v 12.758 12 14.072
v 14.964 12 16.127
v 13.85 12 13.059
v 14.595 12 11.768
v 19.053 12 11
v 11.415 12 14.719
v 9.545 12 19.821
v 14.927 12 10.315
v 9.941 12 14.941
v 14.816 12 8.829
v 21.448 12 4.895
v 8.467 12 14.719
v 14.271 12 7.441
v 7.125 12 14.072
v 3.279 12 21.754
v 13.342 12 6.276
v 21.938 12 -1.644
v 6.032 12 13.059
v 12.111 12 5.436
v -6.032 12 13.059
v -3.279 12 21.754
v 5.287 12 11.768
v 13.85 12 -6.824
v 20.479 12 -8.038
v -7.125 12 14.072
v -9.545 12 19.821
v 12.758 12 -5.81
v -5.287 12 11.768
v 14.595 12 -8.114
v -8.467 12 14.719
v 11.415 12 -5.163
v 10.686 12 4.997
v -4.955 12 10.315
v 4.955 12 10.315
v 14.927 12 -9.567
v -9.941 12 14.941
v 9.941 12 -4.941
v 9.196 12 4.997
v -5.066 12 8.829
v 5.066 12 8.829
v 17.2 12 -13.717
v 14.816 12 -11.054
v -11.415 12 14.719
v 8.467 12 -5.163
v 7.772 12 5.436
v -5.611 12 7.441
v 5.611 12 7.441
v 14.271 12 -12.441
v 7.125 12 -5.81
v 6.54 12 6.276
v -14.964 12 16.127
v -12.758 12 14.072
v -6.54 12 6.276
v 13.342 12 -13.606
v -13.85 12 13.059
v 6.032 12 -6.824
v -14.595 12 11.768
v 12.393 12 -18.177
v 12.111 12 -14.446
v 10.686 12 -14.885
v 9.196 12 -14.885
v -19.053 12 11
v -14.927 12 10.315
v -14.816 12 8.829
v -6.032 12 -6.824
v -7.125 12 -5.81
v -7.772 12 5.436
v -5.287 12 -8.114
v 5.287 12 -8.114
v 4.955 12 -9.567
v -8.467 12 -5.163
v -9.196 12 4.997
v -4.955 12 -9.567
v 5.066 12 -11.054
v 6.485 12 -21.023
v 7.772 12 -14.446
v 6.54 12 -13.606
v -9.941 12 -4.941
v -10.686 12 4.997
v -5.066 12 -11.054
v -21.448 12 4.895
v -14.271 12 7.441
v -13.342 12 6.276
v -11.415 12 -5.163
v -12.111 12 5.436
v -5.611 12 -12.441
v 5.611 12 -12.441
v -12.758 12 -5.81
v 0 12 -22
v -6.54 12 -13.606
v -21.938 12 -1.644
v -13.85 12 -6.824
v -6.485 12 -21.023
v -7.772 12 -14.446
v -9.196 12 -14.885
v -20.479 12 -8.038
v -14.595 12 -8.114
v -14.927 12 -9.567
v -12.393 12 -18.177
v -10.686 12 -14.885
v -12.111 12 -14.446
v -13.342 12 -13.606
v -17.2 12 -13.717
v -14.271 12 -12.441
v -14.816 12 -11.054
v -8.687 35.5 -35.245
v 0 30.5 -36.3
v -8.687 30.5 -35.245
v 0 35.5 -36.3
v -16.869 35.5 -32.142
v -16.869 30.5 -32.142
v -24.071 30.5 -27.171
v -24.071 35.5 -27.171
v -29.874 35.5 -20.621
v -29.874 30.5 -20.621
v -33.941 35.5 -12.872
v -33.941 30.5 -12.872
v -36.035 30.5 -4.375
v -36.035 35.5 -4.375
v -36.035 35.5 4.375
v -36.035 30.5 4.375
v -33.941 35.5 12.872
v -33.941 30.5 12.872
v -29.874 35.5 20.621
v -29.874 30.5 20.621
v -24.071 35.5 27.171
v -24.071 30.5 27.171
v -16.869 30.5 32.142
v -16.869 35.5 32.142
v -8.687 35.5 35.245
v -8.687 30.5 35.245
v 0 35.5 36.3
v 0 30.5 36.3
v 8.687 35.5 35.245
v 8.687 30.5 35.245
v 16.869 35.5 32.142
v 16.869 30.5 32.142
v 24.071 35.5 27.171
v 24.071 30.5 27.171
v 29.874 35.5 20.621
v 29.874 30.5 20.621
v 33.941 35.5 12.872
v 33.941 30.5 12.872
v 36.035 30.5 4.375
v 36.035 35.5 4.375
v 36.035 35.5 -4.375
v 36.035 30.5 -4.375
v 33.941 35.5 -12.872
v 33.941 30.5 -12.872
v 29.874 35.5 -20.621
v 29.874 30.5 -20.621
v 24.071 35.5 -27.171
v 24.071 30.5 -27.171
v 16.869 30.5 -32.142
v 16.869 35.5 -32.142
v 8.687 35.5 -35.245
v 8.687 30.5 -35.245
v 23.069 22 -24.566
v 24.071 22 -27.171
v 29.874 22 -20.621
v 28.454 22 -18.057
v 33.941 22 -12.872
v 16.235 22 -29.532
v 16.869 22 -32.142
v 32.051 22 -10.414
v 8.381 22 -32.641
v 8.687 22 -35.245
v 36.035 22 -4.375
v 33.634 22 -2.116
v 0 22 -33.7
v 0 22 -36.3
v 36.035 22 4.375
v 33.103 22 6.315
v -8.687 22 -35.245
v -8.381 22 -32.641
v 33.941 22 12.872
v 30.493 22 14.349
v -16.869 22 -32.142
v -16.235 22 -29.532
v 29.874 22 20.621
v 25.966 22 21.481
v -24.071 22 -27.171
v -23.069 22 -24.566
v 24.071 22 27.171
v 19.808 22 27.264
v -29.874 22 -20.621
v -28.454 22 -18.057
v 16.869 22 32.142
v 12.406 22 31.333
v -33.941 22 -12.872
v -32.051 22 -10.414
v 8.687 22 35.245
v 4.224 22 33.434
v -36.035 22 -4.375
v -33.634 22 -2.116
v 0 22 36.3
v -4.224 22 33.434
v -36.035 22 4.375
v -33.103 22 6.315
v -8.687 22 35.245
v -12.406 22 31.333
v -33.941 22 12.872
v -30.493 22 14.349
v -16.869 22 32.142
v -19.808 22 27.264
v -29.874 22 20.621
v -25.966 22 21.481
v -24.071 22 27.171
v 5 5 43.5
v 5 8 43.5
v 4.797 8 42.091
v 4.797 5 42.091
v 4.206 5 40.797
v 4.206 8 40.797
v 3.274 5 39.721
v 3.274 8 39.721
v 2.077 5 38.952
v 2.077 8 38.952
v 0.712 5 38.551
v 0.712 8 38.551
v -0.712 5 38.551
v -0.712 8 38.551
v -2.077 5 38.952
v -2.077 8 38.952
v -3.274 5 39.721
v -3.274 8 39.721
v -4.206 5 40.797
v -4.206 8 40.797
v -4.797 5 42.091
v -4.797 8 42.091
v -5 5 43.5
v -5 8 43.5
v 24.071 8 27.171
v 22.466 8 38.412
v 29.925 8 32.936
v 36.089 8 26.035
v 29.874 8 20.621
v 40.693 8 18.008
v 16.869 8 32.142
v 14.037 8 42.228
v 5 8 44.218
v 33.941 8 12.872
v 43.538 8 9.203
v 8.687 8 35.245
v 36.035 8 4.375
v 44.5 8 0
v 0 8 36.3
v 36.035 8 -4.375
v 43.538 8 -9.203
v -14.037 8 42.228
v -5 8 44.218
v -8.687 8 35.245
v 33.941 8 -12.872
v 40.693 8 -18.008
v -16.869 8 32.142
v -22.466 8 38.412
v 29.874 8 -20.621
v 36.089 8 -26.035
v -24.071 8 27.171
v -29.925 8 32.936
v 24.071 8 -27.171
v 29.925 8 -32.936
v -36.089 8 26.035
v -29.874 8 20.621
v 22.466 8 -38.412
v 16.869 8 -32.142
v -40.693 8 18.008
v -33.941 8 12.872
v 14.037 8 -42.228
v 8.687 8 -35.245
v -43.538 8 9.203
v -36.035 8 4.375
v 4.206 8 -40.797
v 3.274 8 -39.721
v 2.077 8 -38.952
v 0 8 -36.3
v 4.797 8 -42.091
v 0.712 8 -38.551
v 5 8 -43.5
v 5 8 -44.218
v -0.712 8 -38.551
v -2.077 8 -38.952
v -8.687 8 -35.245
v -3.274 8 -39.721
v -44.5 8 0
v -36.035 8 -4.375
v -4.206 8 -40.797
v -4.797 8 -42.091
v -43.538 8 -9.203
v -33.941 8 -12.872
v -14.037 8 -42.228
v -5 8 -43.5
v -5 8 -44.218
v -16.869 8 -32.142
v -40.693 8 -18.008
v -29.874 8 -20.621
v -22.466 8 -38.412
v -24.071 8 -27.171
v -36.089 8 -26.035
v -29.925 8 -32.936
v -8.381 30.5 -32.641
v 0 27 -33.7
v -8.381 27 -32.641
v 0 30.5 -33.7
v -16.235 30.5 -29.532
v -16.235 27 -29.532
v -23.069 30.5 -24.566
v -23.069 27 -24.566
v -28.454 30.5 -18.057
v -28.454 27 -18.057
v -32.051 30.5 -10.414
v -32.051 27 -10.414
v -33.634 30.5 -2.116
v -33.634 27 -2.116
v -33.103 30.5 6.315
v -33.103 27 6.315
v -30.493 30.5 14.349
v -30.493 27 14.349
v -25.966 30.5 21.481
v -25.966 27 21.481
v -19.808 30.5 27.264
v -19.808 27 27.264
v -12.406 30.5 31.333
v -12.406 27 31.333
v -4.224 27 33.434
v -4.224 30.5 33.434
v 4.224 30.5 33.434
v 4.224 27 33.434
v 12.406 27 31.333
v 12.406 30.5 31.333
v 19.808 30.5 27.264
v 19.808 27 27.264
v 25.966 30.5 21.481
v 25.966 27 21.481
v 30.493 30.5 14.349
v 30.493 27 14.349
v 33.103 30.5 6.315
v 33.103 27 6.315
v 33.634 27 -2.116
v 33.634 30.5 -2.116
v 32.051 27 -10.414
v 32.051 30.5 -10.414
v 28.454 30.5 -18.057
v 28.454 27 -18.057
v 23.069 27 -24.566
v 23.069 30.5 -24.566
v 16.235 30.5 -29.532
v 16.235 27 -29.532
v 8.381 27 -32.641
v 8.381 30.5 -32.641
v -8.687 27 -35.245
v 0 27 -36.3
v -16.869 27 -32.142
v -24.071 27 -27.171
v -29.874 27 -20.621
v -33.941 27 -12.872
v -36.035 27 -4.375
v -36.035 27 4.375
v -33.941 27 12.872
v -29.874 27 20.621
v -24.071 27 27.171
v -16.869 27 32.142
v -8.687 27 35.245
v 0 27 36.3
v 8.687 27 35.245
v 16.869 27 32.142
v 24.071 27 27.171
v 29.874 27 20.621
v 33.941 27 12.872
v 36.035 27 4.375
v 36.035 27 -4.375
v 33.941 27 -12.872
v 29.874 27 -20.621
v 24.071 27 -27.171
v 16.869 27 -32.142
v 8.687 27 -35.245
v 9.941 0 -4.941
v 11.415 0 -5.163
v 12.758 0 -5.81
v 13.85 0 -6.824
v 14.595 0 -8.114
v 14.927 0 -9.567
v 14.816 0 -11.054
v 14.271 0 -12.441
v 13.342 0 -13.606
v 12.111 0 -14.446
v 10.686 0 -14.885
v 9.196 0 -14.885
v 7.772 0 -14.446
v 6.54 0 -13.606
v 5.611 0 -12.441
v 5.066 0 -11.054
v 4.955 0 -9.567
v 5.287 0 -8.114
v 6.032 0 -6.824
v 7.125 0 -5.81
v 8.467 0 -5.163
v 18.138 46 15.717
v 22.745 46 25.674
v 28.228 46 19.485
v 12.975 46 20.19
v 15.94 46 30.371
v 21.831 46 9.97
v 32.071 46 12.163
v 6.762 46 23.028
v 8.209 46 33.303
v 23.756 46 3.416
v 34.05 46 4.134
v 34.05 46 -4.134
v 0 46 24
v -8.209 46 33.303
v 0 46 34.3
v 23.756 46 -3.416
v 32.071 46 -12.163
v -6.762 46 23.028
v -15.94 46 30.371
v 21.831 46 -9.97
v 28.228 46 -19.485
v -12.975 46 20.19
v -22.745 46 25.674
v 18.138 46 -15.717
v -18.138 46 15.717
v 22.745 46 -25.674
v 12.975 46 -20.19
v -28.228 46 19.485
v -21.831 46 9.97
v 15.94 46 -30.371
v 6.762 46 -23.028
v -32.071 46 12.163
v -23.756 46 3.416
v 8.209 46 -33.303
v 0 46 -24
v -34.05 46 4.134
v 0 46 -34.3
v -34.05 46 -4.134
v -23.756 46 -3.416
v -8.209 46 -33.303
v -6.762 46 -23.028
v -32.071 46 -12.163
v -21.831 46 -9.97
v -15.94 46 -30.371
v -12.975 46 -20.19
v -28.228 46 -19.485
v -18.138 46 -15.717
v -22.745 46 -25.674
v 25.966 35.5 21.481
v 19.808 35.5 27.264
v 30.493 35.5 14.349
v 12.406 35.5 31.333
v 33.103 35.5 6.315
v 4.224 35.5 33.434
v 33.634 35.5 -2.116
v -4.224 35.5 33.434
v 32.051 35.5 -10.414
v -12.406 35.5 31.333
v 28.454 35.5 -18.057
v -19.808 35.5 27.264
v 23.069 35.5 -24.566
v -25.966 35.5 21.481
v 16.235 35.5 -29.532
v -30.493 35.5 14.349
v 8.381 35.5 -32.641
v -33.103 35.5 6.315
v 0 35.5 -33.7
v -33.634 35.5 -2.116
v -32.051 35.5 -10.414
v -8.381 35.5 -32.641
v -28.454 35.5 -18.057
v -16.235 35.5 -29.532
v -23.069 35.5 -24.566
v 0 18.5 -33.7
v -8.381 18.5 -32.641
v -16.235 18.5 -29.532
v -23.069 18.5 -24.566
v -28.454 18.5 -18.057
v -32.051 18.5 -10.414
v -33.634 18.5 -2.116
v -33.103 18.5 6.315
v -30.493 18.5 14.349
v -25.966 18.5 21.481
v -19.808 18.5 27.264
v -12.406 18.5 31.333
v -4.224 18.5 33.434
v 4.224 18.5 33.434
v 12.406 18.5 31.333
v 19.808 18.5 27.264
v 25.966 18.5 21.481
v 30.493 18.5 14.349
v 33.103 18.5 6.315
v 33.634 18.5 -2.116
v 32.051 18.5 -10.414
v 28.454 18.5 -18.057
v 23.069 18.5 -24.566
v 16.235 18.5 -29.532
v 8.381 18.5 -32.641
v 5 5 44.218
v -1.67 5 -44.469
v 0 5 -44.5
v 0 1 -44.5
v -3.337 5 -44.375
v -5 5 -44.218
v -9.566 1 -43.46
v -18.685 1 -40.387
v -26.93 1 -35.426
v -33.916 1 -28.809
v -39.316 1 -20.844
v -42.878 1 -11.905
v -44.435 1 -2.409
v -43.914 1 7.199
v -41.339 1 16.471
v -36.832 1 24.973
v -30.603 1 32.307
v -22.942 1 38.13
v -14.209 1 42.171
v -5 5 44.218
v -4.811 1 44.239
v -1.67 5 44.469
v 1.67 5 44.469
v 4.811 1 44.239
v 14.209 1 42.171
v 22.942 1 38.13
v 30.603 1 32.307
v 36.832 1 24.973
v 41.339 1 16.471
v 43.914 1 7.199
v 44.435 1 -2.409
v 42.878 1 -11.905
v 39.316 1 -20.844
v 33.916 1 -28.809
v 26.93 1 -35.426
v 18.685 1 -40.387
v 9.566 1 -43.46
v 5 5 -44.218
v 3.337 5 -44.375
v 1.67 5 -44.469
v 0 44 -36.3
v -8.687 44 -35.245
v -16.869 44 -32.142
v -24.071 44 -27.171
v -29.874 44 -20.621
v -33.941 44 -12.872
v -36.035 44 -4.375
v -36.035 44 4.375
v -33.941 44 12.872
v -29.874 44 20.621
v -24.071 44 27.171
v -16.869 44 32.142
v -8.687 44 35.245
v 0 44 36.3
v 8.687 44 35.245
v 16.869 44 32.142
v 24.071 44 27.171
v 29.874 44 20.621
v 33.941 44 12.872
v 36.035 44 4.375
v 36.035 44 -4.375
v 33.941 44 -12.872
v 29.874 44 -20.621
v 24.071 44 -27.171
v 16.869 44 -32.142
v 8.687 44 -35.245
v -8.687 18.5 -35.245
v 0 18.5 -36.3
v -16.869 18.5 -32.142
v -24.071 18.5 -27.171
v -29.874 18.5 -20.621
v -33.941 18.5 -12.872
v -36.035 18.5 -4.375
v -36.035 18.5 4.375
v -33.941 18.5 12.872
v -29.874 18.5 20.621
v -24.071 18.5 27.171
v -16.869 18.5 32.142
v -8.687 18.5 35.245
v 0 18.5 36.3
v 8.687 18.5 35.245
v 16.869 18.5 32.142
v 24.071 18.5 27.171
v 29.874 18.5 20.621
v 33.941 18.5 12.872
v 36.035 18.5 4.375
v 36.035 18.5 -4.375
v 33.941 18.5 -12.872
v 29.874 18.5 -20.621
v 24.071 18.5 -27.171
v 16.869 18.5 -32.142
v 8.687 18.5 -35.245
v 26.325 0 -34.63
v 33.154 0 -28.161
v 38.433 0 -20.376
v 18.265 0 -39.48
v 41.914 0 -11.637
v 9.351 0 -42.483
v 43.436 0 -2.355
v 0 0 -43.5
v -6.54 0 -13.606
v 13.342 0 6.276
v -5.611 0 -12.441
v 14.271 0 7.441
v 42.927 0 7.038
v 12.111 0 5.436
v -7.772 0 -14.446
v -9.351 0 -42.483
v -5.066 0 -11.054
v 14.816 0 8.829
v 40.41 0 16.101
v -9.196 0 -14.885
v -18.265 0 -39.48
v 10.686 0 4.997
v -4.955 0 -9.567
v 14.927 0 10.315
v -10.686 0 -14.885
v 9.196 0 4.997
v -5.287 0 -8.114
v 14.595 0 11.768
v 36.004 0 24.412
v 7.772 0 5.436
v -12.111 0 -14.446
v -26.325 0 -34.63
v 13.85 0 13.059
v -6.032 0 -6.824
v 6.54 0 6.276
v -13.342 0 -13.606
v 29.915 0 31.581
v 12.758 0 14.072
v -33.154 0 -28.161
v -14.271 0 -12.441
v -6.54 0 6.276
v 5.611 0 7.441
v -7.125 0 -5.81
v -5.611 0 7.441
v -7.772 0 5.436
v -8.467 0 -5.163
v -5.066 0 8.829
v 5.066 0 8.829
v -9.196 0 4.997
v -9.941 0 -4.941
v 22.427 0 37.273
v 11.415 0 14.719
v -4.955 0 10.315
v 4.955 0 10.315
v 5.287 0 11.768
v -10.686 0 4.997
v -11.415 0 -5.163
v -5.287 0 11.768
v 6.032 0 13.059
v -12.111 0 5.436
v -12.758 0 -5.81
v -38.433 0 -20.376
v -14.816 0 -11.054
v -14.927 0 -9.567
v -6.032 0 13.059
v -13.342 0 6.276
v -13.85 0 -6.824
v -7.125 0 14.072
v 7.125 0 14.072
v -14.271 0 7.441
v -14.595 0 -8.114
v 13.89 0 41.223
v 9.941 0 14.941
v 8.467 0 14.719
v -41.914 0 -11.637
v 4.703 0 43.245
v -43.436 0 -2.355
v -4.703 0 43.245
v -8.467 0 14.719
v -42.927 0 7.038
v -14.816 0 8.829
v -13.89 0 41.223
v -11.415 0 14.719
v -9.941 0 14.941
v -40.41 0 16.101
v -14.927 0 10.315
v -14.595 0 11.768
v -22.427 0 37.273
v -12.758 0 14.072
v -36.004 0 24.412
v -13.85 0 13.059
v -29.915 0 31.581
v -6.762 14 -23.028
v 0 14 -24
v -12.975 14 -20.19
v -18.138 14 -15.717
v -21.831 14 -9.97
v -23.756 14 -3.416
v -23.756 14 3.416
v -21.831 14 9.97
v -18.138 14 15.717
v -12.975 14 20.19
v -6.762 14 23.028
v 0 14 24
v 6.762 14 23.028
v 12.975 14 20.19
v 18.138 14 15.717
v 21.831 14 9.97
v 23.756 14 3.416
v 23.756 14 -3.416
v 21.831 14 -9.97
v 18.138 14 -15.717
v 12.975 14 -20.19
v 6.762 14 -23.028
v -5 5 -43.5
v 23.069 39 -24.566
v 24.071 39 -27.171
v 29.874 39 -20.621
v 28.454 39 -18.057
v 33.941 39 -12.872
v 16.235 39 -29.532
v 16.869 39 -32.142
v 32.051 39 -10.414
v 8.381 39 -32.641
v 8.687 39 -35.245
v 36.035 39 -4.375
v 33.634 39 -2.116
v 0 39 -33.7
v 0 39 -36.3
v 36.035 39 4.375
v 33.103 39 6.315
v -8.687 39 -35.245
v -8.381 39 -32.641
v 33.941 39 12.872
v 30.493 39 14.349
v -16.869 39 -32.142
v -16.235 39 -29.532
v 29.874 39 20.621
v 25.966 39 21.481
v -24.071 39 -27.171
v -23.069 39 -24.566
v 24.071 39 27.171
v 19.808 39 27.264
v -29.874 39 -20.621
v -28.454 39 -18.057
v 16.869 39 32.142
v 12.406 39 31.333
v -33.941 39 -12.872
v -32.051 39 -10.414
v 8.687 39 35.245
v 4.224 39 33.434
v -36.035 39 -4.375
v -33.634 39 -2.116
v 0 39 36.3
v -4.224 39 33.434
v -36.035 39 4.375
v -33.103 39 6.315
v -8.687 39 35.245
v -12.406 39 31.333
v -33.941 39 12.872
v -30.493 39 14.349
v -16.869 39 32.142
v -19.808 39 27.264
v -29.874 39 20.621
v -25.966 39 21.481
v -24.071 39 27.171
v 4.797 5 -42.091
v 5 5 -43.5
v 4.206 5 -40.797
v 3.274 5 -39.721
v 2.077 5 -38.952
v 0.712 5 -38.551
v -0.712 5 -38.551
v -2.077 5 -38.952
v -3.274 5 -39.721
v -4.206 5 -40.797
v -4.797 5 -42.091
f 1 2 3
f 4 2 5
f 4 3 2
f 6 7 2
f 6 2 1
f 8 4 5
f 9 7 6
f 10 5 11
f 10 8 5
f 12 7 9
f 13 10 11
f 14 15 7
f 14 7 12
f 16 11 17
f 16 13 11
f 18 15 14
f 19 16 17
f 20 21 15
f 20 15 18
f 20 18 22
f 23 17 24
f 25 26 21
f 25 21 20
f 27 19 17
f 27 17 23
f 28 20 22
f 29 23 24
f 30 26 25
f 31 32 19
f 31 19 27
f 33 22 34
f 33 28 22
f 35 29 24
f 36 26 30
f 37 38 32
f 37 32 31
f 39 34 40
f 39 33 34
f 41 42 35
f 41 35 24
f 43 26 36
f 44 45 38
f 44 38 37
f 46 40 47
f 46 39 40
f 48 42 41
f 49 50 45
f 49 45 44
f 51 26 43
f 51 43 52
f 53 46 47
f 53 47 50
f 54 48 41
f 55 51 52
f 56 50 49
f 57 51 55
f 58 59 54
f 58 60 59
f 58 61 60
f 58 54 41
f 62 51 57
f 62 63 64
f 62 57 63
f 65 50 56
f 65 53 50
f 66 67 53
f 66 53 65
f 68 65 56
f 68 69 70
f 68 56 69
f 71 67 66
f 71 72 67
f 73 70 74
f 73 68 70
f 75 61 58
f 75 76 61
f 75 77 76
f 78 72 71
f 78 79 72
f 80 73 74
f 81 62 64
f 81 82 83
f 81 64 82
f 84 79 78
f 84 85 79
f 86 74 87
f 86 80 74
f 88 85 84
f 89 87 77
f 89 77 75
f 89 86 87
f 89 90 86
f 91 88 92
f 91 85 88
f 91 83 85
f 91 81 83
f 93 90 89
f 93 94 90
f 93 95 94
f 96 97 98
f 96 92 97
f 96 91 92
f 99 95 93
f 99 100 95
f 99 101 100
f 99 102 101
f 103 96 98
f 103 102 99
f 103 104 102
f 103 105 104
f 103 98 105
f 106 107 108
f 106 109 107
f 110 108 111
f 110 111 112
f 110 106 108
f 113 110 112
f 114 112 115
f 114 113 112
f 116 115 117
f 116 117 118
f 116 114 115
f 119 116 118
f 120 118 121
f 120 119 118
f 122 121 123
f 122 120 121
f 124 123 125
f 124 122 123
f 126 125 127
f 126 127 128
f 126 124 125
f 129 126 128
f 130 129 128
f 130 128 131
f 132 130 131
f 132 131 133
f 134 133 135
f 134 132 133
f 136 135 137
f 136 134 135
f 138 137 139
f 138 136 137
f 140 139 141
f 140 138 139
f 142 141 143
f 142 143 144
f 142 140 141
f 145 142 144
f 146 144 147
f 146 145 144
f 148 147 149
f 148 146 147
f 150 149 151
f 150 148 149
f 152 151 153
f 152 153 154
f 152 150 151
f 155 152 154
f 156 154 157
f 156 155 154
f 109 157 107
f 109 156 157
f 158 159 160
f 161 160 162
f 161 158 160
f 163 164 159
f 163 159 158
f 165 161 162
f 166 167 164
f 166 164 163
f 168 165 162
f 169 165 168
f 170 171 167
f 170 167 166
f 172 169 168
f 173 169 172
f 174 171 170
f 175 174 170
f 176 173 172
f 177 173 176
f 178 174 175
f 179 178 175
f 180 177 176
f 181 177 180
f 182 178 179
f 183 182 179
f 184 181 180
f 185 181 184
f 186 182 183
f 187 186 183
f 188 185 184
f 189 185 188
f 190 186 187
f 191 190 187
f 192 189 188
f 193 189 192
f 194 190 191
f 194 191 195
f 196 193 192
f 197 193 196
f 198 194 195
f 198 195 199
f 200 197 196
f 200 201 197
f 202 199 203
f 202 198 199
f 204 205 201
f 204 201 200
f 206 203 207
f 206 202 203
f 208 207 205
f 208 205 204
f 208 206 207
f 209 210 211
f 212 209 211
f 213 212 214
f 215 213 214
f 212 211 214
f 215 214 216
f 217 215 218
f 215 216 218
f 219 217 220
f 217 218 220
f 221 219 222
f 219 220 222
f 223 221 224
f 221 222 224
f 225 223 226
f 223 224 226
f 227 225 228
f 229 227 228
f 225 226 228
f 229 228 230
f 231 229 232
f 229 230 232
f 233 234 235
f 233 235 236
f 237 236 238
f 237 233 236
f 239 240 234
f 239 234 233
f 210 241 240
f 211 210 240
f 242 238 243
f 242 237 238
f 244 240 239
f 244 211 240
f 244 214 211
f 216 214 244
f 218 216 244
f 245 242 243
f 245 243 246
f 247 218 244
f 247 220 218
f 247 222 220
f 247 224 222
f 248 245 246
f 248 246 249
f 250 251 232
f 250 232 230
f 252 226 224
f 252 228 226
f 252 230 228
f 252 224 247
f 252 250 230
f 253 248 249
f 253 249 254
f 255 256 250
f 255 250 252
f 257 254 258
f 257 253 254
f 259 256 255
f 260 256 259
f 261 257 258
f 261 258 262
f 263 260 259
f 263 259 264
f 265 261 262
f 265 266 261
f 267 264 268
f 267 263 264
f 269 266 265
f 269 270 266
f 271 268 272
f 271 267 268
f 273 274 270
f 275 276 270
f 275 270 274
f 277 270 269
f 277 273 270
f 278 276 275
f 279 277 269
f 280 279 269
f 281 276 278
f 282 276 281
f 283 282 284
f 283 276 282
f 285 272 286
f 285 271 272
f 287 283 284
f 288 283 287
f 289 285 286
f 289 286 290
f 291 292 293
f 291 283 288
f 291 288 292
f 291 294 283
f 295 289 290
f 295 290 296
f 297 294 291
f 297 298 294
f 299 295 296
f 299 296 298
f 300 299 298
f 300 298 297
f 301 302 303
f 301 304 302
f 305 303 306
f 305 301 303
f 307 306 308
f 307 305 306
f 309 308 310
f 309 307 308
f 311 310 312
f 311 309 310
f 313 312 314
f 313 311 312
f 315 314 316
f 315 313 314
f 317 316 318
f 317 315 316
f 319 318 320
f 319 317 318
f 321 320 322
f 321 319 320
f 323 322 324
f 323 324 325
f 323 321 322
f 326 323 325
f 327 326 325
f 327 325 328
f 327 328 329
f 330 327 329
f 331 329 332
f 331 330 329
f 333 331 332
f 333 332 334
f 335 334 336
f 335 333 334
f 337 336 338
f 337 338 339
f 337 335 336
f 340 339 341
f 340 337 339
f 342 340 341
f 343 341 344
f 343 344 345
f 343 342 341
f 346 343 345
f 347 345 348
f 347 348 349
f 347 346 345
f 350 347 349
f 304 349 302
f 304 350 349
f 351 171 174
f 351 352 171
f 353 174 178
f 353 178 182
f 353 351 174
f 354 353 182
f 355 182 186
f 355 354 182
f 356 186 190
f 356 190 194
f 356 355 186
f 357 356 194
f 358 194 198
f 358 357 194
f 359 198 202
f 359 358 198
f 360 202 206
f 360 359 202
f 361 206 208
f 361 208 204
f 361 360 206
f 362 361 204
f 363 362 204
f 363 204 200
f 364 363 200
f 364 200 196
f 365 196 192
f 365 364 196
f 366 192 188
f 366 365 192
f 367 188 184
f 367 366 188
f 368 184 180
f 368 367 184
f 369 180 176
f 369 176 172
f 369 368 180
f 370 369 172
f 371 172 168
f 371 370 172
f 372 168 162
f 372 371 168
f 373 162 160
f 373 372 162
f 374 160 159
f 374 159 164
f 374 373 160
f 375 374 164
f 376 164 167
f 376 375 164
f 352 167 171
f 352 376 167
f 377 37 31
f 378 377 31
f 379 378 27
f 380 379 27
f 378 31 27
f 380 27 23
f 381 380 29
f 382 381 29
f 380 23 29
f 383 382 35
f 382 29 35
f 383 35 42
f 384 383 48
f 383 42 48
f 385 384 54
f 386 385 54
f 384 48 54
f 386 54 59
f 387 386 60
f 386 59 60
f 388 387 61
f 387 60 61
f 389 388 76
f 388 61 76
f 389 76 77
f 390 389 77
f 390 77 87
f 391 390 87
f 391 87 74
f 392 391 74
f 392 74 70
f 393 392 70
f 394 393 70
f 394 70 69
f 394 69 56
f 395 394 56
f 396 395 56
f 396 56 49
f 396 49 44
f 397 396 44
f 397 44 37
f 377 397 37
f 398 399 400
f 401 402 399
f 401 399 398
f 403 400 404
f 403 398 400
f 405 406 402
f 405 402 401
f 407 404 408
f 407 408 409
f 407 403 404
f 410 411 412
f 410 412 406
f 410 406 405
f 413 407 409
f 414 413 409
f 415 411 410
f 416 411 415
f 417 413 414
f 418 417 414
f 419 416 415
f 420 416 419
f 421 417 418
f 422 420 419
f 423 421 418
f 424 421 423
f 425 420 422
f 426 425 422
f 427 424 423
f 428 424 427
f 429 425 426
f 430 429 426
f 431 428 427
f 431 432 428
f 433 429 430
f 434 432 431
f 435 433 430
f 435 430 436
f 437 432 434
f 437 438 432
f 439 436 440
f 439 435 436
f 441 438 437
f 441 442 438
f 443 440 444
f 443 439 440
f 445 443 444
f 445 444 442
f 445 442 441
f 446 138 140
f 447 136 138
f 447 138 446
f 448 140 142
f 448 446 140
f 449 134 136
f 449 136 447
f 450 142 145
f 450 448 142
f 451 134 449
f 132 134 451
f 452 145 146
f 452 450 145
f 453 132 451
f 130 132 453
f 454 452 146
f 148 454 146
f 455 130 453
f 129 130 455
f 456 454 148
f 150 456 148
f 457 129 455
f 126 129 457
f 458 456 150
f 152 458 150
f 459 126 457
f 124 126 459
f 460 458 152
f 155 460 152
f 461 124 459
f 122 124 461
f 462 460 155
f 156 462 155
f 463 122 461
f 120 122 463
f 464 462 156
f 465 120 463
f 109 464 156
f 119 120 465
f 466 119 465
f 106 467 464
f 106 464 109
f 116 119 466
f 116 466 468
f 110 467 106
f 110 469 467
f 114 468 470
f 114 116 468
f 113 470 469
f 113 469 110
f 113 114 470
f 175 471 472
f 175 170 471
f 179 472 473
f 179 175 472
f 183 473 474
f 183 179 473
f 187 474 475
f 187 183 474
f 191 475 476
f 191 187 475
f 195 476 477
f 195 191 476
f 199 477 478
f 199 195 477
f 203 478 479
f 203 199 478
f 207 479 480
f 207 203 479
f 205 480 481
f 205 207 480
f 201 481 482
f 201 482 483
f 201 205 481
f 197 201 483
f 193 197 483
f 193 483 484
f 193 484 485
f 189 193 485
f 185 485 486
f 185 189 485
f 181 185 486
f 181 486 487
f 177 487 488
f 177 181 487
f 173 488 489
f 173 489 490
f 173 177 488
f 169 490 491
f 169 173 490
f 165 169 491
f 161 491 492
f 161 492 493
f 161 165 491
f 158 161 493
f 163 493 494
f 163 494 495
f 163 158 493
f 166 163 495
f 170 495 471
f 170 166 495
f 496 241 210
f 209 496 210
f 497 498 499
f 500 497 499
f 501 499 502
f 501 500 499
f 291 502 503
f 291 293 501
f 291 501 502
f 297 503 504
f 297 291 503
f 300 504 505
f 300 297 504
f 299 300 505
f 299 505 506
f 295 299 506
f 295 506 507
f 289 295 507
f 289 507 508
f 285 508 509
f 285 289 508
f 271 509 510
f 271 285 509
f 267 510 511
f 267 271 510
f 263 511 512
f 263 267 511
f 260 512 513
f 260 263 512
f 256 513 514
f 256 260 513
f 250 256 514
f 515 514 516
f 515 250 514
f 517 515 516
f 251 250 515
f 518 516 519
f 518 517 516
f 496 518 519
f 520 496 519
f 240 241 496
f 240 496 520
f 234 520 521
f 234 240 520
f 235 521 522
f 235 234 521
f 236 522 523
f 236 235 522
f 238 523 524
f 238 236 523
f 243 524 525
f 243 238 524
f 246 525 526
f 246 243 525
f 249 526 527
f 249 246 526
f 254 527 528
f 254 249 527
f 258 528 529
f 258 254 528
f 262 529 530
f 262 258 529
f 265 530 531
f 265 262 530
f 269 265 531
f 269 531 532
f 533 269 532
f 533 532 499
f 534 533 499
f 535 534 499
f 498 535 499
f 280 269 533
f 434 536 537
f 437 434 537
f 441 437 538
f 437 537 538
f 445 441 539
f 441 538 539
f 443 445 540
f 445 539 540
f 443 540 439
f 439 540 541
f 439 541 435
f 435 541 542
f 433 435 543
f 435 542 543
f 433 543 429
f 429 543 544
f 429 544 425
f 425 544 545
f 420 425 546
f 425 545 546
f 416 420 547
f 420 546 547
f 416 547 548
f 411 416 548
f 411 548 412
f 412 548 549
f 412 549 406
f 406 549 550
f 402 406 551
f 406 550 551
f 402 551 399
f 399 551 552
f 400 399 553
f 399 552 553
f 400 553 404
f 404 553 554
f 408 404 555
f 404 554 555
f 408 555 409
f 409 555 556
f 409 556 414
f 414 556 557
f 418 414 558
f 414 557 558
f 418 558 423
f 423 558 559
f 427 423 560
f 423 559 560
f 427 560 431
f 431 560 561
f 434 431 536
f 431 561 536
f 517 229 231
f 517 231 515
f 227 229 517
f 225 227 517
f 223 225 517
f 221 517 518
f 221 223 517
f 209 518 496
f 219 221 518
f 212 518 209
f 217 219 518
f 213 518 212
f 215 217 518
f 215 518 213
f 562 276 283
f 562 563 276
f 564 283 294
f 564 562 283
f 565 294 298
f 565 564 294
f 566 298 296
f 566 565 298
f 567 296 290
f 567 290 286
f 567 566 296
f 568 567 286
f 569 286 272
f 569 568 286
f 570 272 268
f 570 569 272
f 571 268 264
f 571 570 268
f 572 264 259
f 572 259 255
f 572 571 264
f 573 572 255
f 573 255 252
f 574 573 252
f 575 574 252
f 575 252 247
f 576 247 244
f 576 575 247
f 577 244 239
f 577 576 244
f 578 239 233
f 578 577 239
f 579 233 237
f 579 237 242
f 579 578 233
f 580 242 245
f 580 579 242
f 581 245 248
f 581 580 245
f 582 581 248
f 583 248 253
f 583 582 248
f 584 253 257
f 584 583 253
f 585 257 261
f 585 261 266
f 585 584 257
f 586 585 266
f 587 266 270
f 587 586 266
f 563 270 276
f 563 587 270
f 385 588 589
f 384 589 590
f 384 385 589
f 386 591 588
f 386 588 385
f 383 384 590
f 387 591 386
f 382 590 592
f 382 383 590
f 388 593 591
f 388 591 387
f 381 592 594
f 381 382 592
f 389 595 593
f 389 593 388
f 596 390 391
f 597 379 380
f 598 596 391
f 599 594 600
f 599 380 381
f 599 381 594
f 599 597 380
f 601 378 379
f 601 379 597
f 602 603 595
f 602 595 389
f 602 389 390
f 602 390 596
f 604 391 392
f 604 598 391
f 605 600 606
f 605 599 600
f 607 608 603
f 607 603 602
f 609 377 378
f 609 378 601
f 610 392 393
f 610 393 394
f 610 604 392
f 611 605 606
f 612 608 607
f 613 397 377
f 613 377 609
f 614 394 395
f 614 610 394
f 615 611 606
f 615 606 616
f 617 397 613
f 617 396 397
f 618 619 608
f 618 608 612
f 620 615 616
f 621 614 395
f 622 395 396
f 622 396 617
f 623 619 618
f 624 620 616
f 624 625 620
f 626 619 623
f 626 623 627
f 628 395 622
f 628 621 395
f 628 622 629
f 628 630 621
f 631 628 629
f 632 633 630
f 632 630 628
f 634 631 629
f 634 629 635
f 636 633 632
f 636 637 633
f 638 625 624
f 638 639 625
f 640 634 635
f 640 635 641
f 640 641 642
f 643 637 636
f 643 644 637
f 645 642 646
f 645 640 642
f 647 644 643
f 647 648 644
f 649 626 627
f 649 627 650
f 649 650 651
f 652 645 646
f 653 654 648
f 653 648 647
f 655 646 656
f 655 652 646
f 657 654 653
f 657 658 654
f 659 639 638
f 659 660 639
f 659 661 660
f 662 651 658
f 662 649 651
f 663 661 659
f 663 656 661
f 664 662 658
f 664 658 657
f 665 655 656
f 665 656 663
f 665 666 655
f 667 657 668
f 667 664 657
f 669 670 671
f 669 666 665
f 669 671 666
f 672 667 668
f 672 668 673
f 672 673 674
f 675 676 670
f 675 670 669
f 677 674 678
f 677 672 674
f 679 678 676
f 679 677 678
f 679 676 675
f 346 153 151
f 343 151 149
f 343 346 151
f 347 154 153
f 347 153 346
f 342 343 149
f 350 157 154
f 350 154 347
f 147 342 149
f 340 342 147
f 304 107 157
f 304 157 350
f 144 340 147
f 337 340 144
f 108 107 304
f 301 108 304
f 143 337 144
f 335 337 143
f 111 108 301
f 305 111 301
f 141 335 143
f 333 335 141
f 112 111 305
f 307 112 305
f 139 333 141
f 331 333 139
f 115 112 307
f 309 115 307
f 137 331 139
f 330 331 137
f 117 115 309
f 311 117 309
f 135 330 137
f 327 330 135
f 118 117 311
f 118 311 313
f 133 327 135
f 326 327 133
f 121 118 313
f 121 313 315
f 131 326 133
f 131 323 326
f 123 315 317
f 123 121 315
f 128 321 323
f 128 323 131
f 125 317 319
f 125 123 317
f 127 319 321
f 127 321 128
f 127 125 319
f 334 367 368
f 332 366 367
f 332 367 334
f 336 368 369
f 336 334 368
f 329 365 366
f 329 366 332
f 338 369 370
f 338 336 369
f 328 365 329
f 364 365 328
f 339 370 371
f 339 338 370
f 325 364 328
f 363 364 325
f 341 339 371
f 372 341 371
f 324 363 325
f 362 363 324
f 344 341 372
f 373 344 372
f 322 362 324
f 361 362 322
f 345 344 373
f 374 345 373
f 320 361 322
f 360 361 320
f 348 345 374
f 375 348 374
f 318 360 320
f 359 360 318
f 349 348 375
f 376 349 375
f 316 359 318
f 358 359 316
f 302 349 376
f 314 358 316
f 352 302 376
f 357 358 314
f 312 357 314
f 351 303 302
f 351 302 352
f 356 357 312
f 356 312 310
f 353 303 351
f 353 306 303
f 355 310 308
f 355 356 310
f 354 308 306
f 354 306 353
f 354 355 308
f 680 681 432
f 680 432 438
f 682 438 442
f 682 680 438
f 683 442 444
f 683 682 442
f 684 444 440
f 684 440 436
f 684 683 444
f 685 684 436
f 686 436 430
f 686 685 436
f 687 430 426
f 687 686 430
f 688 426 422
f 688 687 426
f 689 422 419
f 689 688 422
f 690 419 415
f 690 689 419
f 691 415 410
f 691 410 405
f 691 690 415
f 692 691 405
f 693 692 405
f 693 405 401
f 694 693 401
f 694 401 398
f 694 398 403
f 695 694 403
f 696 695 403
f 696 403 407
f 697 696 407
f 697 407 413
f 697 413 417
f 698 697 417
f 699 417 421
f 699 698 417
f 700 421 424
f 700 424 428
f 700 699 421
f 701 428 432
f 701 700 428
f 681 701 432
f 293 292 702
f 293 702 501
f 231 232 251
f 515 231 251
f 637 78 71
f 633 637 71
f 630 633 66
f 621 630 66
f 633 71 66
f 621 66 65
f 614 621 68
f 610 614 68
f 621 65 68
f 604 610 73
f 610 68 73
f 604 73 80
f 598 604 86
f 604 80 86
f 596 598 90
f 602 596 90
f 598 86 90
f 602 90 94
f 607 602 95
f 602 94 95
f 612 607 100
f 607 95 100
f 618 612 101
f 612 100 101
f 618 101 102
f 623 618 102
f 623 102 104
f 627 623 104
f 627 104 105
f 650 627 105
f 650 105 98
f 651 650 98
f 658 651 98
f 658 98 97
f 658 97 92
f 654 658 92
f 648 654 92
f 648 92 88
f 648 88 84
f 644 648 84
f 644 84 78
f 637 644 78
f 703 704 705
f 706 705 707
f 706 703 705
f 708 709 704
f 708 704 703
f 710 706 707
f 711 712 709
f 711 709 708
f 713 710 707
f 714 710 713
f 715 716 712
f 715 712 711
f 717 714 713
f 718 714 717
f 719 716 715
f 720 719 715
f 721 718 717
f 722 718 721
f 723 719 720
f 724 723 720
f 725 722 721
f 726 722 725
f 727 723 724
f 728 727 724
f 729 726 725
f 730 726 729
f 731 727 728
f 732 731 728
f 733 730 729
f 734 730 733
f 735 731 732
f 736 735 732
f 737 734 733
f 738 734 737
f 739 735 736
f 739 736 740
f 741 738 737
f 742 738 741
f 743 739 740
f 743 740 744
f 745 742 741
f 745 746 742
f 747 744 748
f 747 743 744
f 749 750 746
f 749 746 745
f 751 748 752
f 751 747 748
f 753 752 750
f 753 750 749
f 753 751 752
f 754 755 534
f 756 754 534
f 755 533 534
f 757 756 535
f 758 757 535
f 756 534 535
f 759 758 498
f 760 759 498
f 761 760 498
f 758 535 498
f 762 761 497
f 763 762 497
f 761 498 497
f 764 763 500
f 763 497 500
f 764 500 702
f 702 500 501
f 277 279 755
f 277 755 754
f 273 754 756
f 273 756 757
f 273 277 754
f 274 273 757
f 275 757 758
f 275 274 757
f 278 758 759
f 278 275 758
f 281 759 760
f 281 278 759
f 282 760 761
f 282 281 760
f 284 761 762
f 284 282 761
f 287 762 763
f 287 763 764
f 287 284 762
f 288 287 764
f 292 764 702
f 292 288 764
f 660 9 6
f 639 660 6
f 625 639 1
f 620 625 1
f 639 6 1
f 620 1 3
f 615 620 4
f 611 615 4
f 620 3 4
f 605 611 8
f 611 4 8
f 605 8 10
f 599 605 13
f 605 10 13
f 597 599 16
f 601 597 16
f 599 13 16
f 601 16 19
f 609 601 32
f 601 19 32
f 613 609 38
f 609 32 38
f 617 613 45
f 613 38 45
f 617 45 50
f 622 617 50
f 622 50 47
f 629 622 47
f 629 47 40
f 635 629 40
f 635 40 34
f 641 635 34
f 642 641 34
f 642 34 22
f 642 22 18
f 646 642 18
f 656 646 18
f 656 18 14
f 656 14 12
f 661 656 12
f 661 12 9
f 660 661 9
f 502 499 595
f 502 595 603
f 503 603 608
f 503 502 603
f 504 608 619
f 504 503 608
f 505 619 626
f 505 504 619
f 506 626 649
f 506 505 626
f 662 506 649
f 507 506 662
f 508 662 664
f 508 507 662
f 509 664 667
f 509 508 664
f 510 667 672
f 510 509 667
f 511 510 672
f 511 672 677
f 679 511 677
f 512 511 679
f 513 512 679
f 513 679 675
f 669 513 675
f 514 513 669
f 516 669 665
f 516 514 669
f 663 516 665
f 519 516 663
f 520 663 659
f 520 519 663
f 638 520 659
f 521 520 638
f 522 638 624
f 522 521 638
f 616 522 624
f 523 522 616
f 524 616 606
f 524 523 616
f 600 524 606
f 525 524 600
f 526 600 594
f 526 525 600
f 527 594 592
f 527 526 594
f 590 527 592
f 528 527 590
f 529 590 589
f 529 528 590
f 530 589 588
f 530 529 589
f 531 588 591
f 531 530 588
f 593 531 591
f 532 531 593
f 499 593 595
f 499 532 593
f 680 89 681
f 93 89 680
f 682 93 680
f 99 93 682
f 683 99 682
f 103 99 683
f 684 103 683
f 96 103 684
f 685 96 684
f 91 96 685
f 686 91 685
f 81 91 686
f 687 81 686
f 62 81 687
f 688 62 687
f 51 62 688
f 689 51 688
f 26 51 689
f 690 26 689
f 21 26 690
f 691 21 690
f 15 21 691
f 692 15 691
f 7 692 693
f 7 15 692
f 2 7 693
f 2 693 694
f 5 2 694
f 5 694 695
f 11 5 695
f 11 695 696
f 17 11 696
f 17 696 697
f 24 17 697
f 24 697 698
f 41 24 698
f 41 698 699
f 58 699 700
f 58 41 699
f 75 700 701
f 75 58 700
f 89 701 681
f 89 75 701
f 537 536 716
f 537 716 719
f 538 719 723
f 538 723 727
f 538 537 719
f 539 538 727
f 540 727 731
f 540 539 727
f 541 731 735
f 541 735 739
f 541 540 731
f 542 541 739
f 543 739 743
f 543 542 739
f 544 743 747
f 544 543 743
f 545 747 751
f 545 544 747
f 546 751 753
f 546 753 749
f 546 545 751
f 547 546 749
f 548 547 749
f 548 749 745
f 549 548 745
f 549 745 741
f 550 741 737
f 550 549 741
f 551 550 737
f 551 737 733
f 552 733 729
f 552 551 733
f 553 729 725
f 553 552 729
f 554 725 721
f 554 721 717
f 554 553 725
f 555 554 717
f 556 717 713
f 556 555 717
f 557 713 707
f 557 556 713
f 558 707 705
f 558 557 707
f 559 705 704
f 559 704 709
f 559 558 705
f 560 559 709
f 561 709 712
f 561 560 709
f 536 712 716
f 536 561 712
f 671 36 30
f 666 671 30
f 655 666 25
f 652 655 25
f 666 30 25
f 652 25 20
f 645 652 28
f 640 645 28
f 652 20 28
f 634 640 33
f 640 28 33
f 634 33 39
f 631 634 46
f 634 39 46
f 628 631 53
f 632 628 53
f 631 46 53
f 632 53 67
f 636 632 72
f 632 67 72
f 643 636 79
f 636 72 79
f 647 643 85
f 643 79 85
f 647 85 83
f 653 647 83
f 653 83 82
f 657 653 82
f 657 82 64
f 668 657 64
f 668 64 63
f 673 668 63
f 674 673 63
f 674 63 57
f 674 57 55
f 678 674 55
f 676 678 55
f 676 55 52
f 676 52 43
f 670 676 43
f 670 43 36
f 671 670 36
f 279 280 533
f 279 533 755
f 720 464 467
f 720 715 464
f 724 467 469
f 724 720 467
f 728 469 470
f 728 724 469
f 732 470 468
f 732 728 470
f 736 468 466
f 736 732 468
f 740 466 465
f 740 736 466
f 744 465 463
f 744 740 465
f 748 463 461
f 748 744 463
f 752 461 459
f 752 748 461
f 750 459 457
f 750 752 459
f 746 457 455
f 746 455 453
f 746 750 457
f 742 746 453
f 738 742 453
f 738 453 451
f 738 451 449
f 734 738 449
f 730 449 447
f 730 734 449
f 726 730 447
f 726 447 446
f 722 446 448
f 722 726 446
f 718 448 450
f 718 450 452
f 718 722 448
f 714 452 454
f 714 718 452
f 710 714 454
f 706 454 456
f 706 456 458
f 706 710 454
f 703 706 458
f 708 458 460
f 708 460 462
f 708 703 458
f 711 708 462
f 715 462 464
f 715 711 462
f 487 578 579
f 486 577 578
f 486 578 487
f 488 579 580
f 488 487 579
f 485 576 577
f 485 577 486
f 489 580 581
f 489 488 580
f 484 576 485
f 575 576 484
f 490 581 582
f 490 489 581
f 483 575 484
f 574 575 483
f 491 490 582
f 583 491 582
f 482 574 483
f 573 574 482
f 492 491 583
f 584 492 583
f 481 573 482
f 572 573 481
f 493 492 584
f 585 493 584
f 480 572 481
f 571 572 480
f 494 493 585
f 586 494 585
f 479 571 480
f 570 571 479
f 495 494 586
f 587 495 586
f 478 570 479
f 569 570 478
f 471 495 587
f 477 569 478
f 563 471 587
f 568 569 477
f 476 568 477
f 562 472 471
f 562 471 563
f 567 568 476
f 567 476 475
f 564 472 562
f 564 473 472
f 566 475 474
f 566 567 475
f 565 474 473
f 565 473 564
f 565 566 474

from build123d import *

# Parameters (mm, degrees)
CORTE_EXTRUS_O1_DEPTH = 3
ESBO_O4_R             = 5
CORTE_EXTRUS_O2_DEPTH = 72.529714105
CHANFRO1_SIZE         = 2
CHANFRO2_SIZE         = 2
CHANFRO3_SIZE         = 1


with BuildPart() as part:
    # Esboço1 → Revolução1 (revolve)
    with BuildSketch(Plane.XY, mode=Mode.PRIVATE) as revolu_o1_sk:
        Polygon((44.5, 0), (44.5, 8), (36.3, 8), (36.3, 18.5), (33.7, 18.5), (33.7, 22), (36.3, 22), (36.3, 27), (33.7, 27), (33.7, 30.5), (36.3, 30.5), (36.3, 35.5), (33.7, 35.5), (33.7, 39), (36.3, 39), (36.3, 46), (24, 46), (24, 12), (0, 12), (0, 0), align=None)
    revolve(revolu_o1_sk.sketch.rotate(Axis((0, 0, 0), (0, 1, 0)), 90), axis=Axis((0, 0, 0), (0, 1, 0)))

    # Esboço2 → Corte-extrusão1 (cut)
    with BuildSketch(Plane(origin=(0, 8, 0), x_dir=(1, 0, 0), z_dir=(0, 1, 0))):
        with BuildLine():
            Line((-5, 43.5), (-5, 45.5))
            ThreePointArc((-5, 45.5), (0, 50.5), (5, 45.5))
            Line((5, 45.5), (5, 43.5))
            ThreePointArc((5, 43.5), (0, 38.5), (-5, 43.5))
        make_face()
        with BuildLine():
            Line((-5, -43.5), (-5, -45.5))
            ThreePointArc((-5, -45.5), (0, -50.5), (5, -45.5))
            Line((5, -45.5), (5, -43.5))
            ThreePointArc((5, -43.5), (0, -38.5), (-5, -43.5))
        make_face()
    extrude(amount=-CORTE_EXTRUS_O1_DEPTH, mode=Mode.SUBTRACT)

    # Esboço4 → Corte-extrusão2 (cut, through all)
    with BuildSketch(Plane(origin=(0, 12, 0), x_dir=(1, 0, 0), z_dir=(0, 1, 0))):
        with Locations(Location((-9.941125497, 9.941125497, 0), (0, 0, 270))):
            Circle(ESBO_O4_R)
        with Locations(Location((9.941125497, 9.941125497, 0), (0, 0, 270))):
            Circle(ESBO_O4_R)
        with Locations(Location((-9.941125497, -9.941125497, 0), (0, 0, 270))):
            Circle(ESBO_O4_R)
        with Locations(Location((9.941125497, -9.941125497, 0), (0, 0, 270))):
            Circle(ESBO_O4_R)
    extrude(amount=-CORTE_EXTRUS_O2_DEPTH, mode=Mode.SUBTRACT)

    # Chanfro1
    chanfro1_edges = [part.edges().sort_by_distance(p)[0] for p in [
        (0, 46, 36.3),
    ]]
    chamfer(chanfro1_edges, length=CHANFRO1_SIZE)

    # Chanfro2
    chanfro2_edges = [part.edges().sort_by_distance(p)[0] for p in [
        (0, 12, 24),
    ]]
    chamfer(chanfro2_edges, length=CHANFRO2_SIZE)

    # Chanfro3
    chanfro3_edges = [part.edges().sort_by_distance(p)[0] for p in [
        (0, 0, 44.5),
    ]]
    chamfer(chanfro3_edges, length=CHANFRO3_SIZE)


solid = part.part
